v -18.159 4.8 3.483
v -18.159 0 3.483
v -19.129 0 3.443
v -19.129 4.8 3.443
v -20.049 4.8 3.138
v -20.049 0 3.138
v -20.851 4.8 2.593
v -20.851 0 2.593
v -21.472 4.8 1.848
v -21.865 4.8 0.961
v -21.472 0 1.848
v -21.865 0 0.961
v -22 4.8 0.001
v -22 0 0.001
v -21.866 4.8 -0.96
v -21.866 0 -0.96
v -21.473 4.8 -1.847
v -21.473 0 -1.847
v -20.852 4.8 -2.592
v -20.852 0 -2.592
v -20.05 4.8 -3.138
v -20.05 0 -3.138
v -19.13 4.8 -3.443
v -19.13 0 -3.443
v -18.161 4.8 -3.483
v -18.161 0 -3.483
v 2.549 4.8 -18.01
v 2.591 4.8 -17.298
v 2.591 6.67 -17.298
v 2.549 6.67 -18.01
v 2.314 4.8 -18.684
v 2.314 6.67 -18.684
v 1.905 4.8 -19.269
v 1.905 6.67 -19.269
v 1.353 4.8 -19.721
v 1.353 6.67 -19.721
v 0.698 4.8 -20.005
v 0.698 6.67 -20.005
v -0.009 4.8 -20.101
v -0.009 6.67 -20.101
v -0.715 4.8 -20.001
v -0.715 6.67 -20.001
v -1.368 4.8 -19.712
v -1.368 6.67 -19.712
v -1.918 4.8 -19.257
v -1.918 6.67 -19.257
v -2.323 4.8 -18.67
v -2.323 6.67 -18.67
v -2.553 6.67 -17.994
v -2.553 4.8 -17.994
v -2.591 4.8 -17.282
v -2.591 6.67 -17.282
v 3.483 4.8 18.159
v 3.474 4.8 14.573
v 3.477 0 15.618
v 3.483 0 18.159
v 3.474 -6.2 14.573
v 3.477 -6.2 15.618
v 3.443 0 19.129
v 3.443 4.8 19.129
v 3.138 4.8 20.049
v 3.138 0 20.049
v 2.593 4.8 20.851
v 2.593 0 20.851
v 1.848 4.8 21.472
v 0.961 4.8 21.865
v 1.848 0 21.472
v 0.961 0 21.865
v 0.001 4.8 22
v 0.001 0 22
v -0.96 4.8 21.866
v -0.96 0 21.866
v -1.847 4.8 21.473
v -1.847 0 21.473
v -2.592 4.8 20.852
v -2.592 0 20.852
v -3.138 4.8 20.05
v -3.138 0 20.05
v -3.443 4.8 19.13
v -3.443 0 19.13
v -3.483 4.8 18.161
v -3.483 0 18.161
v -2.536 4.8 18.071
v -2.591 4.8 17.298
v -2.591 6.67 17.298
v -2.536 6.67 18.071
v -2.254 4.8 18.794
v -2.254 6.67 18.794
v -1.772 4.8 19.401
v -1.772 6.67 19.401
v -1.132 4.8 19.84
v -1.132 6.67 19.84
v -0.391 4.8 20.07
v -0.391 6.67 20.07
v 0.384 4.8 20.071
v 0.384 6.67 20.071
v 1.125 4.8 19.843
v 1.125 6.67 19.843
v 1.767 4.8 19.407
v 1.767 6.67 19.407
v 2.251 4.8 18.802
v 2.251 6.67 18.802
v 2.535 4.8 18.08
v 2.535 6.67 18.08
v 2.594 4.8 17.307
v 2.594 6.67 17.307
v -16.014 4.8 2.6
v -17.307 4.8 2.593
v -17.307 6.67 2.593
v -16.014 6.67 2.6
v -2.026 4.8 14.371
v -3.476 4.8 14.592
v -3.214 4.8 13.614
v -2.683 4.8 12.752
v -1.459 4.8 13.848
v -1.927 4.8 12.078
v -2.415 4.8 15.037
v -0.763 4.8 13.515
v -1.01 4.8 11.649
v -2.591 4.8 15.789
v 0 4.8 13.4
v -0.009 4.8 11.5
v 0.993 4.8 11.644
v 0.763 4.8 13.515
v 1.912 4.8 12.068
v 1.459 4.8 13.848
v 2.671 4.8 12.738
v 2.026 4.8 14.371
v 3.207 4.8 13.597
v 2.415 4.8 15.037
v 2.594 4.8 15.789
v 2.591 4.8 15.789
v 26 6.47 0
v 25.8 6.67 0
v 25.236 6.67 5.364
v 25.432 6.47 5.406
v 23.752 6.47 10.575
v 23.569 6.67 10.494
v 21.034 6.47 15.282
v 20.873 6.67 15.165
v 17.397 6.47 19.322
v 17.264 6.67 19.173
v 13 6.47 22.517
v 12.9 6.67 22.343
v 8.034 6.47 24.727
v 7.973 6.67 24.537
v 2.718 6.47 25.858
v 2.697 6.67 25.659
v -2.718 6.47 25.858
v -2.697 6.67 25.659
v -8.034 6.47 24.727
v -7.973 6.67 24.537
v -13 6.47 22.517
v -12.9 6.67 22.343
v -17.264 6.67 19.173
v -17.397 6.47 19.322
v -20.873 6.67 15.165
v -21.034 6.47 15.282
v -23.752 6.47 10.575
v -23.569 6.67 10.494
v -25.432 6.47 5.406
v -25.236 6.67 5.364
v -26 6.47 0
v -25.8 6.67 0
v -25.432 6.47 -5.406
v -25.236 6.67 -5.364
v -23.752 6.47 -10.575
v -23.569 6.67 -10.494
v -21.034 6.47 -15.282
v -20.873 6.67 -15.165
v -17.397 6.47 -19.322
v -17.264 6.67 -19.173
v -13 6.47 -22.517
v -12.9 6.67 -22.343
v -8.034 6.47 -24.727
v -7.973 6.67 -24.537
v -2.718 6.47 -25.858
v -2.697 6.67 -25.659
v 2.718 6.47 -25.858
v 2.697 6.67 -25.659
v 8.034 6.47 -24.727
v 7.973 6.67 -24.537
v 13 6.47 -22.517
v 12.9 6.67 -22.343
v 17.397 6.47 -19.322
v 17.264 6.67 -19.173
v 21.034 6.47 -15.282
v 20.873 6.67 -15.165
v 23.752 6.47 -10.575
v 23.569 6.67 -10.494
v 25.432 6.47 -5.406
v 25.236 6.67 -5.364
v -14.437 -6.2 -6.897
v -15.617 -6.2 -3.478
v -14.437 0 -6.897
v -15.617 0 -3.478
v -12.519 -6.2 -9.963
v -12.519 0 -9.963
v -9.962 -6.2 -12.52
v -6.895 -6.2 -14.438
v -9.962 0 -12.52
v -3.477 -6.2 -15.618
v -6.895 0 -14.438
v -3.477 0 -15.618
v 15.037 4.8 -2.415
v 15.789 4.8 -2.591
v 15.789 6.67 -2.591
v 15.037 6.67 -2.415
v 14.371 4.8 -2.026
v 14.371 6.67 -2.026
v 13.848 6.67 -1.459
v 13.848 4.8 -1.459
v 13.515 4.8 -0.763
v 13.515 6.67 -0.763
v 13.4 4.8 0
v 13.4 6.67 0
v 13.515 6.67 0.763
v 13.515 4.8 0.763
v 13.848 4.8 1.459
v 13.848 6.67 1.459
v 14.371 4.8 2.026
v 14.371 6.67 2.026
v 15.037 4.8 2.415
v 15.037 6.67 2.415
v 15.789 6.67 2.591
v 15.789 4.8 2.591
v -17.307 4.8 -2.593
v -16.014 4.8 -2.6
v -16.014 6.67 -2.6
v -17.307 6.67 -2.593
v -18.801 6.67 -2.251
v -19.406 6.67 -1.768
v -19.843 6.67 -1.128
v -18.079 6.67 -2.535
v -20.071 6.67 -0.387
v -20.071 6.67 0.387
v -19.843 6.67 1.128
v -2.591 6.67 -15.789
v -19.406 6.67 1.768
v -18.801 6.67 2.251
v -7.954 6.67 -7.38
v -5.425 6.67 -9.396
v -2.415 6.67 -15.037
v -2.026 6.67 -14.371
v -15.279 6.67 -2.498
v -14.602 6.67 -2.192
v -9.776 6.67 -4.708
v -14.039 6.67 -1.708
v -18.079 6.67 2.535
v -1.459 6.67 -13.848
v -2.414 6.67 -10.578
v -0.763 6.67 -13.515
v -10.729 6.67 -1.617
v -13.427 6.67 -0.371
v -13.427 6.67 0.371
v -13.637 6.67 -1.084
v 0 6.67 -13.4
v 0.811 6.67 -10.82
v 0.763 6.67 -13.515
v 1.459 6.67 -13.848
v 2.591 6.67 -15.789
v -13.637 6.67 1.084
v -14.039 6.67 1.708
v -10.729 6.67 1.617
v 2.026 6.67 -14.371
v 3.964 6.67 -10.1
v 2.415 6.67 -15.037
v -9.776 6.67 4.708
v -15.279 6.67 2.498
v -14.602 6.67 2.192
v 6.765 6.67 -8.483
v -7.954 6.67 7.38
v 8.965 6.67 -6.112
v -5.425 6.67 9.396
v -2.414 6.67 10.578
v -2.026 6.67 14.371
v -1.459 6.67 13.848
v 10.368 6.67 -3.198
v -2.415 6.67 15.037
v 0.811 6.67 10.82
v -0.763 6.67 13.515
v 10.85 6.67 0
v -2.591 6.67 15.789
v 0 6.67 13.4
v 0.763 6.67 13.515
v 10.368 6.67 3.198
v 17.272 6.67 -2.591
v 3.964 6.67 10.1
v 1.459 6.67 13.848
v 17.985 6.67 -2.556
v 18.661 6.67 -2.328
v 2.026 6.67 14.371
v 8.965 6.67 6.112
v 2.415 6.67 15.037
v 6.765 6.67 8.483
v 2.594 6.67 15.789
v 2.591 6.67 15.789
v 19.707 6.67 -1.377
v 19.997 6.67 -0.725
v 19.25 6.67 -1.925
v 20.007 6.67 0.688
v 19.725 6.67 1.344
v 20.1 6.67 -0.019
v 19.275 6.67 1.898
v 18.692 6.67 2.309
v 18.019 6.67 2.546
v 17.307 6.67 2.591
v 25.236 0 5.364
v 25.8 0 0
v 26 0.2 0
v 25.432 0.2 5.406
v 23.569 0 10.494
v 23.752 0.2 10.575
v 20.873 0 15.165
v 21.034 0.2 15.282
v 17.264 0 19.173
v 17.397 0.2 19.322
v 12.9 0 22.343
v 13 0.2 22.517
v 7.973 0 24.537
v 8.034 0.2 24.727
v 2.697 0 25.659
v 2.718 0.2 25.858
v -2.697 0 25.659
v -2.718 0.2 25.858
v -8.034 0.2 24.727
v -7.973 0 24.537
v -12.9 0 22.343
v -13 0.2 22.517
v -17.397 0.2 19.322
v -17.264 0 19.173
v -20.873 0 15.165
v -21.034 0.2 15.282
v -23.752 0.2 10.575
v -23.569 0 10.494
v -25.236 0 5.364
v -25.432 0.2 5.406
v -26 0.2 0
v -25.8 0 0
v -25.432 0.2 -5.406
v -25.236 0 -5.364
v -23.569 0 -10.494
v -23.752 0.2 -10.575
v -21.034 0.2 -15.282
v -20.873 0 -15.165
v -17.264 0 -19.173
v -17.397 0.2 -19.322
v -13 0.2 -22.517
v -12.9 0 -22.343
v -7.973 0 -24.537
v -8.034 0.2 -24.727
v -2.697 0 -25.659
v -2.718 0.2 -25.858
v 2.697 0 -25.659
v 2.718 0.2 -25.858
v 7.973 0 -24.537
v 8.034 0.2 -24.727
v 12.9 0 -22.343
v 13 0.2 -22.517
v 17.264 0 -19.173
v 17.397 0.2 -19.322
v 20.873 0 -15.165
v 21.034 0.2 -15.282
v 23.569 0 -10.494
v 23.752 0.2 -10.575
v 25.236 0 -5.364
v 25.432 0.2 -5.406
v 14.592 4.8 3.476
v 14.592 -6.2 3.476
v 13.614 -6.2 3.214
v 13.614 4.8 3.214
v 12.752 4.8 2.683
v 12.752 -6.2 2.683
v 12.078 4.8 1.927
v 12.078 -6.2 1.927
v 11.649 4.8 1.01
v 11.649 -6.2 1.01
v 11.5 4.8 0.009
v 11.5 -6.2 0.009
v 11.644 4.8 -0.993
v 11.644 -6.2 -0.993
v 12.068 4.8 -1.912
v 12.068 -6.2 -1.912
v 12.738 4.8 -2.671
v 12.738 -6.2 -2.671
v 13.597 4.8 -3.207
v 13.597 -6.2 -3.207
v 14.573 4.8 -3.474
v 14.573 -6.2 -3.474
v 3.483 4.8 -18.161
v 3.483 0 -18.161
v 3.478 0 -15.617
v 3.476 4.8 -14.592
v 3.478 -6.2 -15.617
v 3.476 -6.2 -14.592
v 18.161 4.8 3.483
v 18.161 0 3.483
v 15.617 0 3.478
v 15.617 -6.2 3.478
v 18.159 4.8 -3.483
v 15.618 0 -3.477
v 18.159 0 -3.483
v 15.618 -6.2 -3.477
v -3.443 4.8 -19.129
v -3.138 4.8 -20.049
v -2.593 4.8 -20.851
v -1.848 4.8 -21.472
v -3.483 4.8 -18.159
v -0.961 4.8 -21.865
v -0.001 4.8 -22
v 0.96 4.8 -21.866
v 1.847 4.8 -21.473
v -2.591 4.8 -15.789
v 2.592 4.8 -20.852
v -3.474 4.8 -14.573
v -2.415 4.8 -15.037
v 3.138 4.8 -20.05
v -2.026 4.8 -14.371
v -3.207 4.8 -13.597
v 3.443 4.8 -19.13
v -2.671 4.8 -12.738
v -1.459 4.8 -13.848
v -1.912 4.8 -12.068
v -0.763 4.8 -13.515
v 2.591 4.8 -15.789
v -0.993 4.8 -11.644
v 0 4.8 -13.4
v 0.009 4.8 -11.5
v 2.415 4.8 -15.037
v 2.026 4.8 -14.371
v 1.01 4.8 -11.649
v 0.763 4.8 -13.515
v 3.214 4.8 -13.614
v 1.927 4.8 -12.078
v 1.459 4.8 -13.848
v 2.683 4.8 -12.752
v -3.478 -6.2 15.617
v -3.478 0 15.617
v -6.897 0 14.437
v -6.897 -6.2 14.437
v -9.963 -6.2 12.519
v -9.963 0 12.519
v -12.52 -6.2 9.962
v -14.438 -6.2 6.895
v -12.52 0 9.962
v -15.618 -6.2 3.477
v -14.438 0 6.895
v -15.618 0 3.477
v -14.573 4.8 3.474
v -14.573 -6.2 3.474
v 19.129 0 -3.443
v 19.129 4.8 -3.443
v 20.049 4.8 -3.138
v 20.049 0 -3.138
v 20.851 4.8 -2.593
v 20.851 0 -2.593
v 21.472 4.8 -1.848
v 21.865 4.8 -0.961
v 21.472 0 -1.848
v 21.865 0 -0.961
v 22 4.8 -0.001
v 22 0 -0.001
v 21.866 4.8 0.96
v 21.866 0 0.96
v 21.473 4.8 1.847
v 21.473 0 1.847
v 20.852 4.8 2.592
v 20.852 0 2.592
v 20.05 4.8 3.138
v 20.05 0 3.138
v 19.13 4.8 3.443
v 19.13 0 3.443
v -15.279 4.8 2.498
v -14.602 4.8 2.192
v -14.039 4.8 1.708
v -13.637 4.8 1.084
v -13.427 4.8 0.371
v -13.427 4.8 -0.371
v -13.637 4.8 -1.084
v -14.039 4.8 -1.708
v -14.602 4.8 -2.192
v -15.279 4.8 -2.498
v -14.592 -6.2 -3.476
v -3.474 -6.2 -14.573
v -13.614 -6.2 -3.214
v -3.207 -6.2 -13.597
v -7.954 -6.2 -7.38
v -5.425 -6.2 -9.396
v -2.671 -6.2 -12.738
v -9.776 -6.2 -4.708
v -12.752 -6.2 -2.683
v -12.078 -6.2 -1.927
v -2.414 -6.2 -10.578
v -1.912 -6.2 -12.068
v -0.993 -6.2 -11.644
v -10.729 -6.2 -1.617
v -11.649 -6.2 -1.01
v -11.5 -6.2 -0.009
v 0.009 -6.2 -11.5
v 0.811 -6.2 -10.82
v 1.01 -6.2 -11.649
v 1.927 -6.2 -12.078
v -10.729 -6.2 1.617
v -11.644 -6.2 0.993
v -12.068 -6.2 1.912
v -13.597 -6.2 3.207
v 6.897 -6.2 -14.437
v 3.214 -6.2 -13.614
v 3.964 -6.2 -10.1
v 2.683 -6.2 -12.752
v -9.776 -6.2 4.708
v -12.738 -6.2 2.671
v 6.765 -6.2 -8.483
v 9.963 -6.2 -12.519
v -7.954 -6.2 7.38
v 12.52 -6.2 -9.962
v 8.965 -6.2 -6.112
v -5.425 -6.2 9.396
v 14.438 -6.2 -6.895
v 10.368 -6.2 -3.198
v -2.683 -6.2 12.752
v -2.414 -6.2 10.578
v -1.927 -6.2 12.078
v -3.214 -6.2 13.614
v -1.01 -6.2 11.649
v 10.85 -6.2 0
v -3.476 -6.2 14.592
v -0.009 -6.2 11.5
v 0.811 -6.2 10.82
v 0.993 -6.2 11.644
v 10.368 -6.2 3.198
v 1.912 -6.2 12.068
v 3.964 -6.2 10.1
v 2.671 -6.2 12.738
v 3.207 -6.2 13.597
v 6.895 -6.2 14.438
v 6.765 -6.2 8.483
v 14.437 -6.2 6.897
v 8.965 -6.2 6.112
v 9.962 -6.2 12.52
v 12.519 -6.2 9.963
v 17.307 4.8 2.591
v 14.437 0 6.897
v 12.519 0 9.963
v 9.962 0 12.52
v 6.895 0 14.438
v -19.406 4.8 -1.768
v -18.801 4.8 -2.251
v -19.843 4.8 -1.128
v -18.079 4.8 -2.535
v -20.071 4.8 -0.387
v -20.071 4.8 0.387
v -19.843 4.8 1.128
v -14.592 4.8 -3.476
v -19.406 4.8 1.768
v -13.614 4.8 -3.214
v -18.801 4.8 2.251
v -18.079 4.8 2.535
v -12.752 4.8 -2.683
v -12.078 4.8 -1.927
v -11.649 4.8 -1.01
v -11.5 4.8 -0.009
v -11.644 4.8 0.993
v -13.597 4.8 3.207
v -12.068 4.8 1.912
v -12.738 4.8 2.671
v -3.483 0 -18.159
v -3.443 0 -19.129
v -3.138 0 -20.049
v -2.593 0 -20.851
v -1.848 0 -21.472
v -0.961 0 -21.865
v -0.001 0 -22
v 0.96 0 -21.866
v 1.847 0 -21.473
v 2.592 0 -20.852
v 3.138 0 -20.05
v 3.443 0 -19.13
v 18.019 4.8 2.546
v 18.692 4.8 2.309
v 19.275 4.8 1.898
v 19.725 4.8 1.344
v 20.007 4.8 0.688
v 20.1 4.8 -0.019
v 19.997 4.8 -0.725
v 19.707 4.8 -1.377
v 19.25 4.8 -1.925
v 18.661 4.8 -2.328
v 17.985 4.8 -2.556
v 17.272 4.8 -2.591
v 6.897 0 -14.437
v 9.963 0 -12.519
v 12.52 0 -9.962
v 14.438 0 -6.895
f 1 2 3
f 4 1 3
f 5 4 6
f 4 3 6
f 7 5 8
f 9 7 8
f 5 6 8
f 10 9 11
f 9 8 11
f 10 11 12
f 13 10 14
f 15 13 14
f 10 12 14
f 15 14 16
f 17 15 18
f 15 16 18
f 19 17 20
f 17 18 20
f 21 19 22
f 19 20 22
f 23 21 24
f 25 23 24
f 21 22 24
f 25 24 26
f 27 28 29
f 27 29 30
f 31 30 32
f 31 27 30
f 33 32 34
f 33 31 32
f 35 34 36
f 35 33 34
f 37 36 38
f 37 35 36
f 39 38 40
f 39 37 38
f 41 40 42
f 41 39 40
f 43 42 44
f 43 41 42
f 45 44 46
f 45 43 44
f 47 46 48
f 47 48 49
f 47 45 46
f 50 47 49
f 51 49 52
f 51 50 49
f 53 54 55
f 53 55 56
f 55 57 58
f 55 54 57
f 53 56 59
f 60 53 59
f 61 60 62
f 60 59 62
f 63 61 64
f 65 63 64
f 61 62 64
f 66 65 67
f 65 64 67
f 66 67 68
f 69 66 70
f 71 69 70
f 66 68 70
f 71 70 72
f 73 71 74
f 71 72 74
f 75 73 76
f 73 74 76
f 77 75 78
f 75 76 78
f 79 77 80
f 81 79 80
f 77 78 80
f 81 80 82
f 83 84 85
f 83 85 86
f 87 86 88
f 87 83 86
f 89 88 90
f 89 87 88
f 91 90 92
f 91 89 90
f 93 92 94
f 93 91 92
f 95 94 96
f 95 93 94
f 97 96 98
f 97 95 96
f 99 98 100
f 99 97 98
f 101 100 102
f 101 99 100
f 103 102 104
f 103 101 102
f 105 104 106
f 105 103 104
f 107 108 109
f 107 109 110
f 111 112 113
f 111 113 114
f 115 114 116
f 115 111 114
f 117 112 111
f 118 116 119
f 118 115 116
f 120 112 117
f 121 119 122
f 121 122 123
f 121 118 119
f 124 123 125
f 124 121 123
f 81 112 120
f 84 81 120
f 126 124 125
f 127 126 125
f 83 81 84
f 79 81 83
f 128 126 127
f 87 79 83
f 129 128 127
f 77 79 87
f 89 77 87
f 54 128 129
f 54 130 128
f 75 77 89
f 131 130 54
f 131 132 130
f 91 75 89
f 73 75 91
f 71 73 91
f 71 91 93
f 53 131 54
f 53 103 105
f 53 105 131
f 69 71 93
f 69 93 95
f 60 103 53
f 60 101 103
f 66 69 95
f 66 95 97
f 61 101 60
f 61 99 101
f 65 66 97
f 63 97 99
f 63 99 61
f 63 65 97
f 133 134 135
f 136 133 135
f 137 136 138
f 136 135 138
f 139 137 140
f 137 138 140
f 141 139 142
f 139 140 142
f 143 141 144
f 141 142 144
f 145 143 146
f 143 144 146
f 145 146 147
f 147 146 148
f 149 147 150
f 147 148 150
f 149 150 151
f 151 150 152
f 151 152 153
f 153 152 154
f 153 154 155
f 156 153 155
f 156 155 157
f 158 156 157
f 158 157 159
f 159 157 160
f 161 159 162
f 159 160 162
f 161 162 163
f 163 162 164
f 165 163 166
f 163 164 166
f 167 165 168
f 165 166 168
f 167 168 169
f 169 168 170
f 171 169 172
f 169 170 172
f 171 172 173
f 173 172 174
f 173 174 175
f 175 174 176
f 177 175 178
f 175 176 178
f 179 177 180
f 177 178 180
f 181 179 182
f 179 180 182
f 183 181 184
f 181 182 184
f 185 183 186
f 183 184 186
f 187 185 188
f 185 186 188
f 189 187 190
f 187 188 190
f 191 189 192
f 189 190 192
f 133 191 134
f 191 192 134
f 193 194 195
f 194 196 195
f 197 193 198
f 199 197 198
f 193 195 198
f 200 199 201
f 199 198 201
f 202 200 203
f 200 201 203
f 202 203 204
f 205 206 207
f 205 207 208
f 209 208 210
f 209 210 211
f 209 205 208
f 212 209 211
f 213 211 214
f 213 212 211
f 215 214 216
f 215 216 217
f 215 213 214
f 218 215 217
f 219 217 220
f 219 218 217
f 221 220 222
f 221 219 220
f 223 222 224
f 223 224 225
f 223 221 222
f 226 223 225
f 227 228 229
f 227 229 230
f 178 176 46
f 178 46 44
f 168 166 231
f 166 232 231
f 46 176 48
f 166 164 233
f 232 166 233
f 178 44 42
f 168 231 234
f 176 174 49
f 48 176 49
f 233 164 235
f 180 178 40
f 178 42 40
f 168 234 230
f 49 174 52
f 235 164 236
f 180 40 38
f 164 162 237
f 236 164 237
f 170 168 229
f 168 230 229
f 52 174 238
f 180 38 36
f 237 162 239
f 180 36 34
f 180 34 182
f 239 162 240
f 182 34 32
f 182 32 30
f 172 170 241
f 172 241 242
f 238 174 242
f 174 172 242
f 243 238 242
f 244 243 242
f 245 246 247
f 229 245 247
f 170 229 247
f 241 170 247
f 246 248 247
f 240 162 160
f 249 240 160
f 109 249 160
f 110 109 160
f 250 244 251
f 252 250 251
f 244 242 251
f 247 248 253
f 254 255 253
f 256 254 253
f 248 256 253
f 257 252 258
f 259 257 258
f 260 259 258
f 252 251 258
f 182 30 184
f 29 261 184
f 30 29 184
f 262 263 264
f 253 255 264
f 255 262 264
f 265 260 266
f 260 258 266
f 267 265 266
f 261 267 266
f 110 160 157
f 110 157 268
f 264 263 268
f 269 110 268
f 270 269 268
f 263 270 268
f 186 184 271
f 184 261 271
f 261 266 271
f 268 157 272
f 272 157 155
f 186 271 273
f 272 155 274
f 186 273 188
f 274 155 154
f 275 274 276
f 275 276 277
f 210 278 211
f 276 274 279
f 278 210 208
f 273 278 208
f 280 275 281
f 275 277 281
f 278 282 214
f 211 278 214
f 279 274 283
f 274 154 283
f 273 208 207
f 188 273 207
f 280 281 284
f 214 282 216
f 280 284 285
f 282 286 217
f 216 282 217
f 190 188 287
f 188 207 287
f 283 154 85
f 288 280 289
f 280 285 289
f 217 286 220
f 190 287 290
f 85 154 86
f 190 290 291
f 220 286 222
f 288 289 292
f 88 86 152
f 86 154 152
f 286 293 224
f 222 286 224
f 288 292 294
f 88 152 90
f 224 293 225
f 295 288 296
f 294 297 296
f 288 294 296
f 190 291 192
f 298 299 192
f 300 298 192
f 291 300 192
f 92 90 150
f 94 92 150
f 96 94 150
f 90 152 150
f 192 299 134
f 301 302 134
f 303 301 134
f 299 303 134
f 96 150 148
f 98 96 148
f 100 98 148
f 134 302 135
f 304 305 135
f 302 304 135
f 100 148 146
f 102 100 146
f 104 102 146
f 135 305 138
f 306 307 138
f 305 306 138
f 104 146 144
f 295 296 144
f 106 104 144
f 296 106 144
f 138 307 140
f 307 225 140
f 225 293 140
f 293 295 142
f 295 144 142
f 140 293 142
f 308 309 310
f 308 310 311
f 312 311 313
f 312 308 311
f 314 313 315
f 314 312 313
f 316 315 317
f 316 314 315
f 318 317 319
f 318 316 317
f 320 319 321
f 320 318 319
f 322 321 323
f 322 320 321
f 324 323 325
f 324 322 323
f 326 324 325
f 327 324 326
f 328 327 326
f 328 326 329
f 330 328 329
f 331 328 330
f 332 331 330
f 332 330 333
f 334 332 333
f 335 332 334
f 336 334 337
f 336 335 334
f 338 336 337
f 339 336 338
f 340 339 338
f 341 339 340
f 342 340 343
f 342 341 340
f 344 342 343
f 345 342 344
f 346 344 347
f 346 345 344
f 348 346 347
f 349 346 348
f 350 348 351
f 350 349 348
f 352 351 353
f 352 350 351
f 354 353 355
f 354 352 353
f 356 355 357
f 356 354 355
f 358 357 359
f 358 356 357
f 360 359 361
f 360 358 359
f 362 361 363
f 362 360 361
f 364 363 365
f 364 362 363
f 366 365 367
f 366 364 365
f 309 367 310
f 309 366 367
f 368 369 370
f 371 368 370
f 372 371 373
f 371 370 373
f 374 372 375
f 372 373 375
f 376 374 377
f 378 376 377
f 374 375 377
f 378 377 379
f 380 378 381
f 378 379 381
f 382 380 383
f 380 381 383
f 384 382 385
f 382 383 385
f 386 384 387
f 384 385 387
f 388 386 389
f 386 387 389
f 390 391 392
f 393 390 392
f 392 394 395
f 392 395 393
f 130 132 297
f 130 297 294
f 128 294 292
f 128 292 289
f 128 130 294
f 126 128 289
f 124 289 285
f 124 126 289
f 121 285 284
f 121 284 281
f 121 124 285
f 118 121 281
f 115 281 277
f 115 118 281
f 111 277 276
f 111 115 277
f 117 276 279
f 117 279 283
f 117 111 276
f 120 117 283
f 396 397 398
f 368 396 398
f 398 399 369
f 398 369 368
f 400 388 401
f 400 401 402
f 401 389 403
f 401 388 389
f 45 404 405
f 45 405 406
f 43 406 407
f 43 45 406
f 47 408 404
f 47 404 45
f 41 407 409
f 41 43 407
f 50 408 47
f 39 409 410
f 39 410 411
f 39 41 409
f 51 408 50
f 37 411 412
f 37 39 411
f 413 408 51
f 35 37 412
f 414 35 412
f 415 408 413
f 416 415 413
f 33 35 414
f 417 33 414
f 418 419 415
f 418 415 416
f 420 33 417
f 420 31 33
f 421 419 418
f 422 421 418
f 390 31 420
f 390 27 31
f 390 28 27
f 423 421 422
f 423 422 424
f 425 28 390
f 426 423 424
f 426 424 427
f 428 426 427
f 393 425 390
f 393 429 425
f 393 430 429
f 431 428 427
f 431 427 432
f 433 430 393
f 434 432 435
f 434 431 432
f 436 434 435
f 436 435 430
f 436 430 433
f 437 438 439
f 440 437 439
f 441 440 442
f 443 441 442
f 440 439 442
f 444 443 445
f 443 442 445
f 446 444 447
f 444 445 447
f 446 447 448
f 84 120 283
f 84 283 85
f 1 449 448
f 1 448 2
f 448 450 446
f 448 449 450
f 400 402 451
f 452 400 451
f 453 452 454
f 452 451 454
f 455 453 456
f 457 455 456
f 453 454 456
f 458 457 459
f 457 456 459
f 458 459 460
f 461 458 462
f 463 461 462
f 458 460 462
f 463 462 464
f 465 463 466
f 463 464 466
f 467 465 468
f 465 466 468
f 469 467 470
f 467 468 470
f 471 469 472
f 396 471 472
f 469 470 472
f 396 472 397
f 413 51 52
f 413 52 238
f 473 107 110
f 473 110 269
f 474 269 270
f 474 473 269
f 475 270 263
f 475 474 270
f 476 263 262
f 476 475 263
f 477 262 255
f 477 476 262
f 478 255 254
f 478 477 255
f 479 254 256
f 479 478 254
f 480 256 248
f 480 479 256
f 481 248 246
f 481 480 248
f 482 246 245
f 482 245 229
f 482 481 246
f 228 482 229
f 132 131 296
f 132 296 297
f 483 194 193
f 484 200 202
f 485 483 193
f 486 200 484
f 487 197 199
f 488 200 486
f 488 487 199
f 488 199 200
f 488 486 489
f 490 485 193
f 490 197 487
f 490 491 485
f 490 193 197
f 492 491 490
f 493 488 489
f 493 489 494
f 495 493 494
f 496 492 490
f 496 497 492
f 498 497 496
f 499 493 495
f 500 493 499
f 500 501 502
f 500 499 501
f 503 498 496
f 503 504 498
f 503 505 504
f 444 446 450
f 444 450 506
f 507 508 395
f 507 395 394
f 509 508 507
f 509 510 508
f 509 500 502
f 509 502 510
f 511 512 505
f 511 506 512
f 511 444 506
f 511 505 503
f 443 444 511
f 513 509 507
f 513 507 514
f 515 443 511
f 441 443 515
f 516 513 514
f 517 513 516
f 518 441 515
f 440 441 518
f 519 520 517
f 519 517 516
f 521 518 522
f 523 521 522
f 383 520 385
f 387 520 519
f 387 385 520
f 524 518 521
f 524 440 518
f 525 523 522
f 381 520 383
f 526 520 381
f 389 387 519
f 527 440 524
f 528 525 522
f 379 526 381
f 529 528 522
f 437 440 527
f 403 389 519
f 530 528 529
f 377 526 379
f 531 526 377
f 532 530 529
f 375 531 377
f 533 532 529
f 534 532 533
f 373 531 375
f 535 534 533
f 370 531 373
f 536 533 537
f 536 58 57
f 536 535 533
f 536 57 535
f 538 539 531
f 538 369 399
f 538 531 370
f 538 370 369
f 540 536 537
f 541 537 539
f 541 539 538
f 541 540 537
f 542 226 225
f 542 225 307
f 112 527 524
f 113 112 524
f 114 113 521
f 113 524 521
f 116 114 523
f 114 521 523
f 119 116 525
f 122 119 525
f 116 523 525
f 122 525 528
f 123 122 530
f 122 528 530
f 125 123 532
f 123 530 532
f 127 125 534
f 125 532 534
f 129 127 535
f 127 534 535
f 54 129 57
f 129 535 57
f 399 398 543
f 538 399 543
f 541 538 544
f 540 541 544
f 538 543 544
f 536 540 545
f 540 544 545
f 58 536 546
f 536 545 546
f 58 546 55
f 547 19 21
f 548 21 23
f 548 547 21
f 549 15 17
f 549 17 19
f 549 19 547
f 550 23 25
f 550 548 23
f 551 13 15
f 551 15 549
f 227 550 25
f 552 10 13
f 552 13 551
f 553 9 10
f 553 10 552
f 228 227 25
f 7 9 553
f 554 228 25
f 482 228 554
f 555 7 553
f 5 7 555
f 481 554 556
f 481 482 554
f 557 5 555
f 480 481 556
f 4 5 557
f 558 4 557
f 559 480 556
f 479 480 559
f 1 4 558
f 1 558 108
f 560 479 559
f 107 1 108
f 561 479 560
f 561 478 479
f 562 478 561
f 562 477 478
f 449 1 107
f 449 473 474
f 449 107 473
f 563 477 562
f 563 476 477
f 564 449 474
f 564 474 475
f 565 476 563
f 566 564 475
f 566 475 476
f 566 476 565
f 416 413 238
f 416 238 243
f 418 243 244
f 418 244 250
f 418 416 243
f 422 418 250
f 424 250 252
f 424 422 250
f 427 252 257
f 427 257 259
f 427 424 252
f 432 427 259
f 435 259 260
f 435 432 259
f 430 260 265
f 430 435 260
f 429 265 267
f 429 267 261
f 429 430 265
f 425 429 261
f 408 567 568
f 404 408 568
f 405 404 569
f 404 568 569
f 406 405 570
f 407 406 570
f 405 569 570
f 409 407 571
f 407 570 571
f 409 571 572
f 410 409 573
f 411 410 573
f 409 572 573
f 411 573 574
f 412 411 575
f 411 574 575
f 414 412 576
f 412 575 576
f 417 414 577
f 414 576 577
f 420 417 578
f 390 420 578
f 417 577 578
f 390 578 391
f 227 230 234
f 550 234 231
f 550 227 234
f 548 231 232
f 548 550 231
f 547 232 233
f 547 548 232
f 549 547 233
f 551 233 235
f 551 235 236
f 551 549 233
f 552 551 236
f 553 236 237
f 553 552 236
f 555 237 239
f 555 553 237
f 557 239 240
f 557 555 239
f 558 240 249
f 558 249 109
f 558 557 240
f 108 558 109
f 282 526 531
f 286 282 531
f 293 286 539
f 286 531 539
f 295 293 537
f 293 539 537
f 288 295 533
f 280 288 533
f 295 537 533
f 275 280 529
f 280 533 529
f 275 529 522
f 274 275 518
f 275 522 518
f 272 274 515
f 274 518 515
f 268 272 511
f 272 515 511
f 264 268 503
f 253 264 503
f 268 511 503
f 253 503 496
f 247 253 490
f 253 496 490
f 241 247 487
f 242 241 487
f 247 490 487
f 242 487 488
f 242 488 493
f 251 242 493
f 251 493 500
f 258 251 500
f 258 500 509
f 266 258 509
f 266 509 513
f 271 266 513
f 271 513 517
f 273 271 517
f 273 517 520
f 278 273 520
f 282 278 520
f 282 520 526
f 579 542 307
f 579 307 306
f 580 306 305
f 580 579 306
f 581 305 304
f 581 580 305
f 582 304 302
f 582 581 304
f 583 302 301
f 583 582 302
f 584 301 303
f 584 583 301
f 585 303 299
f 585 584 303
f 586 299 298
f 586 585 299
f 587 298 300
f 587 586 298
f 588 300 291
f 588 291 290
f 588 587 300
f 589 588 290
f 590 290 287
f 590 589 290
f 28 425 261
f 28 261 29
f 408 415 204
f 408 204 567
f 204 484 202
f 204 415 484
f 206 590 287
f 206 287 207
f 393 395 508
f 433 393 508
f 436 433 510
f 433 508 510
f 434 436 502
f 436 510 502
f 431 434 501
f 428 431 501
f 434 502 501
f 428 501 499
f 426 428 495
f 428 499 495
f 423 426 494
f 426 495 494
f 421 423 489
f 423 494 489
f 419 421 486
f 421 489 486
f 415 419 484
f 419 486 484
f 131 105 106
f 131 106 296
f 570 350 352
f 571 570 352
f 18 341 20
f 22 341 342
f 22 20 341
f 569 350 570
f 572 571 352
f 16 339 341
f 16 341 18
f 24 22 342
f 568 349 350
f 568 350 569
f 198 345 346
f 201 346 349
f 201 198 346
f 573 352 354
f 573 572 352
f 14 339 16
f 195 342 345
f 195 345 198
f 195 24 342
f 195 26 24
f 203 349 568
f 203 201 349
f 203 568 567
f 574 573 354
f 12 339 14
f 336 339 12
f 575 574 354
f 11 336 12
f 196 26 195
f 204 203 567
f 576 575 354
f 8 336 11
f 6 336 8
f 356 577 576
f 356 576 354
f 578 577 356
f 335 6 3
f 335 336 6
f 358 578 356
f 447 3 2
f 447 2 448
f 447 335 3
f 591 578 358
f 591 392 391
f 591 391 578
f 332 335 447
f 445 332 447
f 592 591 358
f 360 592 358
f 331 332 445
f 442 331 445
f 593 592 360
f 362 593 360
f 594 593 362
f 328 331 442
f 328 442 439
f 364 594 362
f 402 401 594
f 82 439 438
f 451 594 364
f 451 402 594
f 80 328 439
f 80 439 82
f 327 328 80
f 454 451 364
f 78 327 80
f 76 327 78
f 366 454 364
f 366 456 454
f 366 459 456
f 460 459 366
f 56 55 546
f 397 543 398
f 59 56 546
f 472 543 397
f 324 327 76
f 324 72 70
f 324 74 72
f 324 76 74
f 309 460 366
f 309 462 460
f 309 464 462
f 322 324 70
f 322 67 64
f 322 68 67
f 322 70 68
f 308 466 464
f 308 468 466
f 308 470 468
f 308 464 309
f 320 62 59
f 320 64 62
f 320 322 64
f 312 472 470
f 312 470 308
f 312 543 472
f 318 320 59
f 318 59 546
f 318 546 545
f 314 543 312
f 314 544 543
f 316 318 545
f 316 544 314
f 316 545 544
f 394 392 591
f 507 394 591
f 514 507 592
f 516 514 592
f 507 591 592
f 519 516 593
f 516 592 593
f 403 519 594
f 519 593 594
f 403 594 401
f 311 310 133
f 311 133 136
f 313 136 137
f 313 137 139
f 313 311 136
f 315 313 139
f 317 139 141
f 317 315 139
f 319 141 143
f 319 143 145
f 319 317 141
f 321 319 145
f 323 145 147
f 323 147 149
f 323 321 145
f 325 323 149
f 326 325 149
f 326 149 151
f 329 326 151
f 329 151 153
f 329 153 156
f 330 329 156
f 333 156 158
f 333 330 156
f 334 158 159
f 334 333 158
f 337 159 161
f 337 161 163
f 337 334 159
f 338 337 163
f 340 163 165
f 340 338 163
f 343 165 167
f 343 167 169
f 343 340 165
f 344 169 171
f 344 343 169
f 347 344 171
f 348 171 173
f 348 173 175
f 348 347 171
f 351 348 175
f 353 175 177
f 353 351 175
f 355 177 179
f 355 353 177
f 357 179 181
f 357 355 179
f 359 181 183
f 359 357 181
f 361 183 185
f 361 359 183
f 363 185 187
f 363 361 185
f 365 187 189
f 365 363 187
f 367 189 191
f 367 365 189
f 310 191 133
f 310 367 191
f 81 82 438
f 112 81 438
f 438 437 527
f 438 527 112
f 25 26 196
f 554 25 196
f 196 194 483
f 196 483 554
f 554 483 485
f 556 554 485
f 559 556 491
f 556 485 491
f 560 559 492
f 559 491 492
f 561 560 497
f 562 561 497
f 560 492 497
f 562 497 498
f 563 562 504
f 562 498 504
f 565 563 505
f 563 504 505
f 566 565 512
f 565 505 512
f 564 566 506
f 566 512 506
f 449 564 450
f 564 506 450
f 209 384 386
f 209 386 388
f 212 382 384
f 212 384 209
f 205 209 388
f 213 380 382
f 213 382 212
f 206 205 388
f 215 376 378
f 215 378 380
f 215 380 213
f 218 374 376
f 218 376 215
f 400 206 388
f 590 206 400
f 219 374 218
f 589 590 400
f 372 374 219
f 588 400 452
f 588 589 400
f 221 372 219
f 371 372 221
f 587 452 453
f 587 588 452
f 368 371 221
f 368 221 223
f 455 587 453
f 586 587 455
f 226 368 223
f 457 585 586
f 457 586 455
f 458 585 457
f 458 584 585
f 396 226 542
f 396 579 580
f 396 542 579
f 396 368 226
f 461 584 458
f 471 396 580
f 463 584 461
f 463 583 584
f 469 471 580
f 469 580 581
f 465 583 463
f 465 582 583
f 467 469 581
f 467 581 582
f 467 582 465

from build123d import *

# Parameters (mm, degrees)
F0_R     = 26
F0_R_2   = 10.85
F1_DEPTH = 6.67
F2_SIZE  = 0.2
F3_R     = 16
F4_DEPTH = 6.2
F5_R     = 10.85
F6_DEPTH = 11


with BuildPart() as f1:
    # F0 (on Front) → F1 (new body)
    with BuildSketch(Plane.XZ):
        Circle(F0_R)
        with BuildLine():
            ThreePointArc((-2.5914037581, -15.78875), (0, -13.4), (2.5914037581, -15.78875))
            Line((2.5914037581, -15.78875), (2.5914037581, -17.2977615707))
            ThreePointArc((2.5914037581, -17.2977615707), (-0.0087763318, -20.1007524005), (-2.5914037581, -17.2815805949))
            Line((-2.5914037581, -17.2815805949), (-2.5914037581, -15.78875))
        make_face(mode=Mode.SUBTRACT)
        with BuildLine():
            ThreePointArc((15.78875, -2.5914037581), (13.4, 0), (15.78875, 2.5914037581))
            Line((15.78875, 2.5914037581), (17.3070686878, 2.5914037581))
            ThreePointArc((17.3070686878, 2.5914037581), (20.1000462874, -0.0189616291), (17.2721013057, -2.5914037581))
            Line((17.2721013057, -2.5914037581), (15.78875, -2.5914037581))
        make_face(mode=Mode.SUBTRACT)
        with BuildLine():
            ThreePointArc((-17.3068571429, -2.592816198), (-20.1, 0), (-17.3068571429, 2.592816198))
            Line((-17.3068571429, 2.592816198), (-16.014371015, 2.5999602831))
            ThreePointArc((-16.014371015, 2.5999602831), (-13.4, 0), (-16.014371015, -2.5999602831))
            Line((-16.014371015, -2.5999602831), (-17.3068571429, -2.592816198))
        make_face(mode=Mode.SUBTRACT)
        Circle(F0_R_2, mode=Mode.SUBTRACT)
        with BuildLine():
            ThreePointArc((2.5914037581, 15.78875), (0, 13.4), (-2.5914037581, 15.78875))
            Line((-2.5914037581, 15.78875), (-2.5914037581, 17.2976958265))
            ThreePointArc((-2.5914037581, 17.2976958265), (-0.0037683158, 20.0993370021), (2.5936213204, 17.3067365048))
            Line((2.5936213204, 17.3067365048), (2.5936213204, 15.8179877846))
            Line((2.5936213204, 15.8179877846), (2.5936213204, 15.78875))
            Line((2.5936213204, 15.78875), (2.5914037581, 15.78875))
        make_face(mode=Mode.SUBTRACT)
    extrude(amount=-F1_DEPTH)

    # F2
    f2_edges = [f1.edges().sort_by_distance(p)[0] for p in [
        (-26, 6.67, 0),
        (-26, 0, 0),
    ]]
    chamfer(f2_edges, length=F2_SIZE)

    # F3 (on face) → F4 (join)
    with BuildSketch(Plane.XZ):
        Circle(F3_R)
    extrude(amount=F4_DEPTH)

    # F5 (on face) → F6 (cut)
    with BuildSketch(Plane.XZ.offset(6.2)):
        Circle(F5_R)
        with BuildLine():
            Line((3.4739061675, 14.57341362), (3.4833905794, 18.1594268488))
            ThreePointArc((3.4833905794, 18.1594268488), (0.0005451634, 21.9999999575), (-3.4834965064, 18.1605120179))
            Line((-3.4834965064, 18.1605120179), (-3.4760989469, 14.5916666667))
            ThreePointArc((-3.4760989469, 14.5916666667), (-0.0091921433, 11.5000120708), (3.4739061675, 14.57341362))
        make_face()
        with BuildLine():
            Line((-14.57341362, 3.4739061675), (-18.1594268488, 3.4833905794))
            ThreePointArc((-18.1594268488, 3.4833905794), (-21.9999999575, 0.0005451634), (-18.1605120179, -3.4834965064))
            Line((-18.1605120179, -3.4834965064), (-14.5916666667, -3.4760989469))
            ThreePointArc((-14.5916666667, -3.4760989469), (-11.5000120708, -0.0091921433), (-14.57341362, 3.4739061675))
        make_face()
        with BuildLine():
            Line((-3.4739061675, -14.57341362), (-3.4833905794, -18.1594268488))
            ThreePointArc((-3.4833905794, -18.1594268488), (-0.0005451634, -21.9999999575), (3.4834965064, -18.1605120179))
            Line((3.4834965064, -18.1605120179), (3.4760989469, -14.5916666667))
            ThreePointArc((3.4760989469, -14.5916666667), (0.0091921433, -11.5000120708), (-3.4739061675, -14.57341362))
        make_face()
        with BuildLine():
            Line((14.57341362, -3.4739061675), (18.1594268488, -3.4833905794))
            ThreePointArc((18.1594268488, -3.4833905794), (21.9999999575, -0.0005451634), (18.1605120179, 3.4834965064))
            Line((18.1605120179, 3.4834965064), (14.5916666667, 3.4760989469))
            ThreePointArc((14.5916666667, 3.4760989469), (11.5000120708, 0.0091921433), (14.57341362, -3.4739061675))
        make_face()
    extrude(amount=-F6_DEPTH, mode=Mode.SUBTRACT)


solid = f1.part
